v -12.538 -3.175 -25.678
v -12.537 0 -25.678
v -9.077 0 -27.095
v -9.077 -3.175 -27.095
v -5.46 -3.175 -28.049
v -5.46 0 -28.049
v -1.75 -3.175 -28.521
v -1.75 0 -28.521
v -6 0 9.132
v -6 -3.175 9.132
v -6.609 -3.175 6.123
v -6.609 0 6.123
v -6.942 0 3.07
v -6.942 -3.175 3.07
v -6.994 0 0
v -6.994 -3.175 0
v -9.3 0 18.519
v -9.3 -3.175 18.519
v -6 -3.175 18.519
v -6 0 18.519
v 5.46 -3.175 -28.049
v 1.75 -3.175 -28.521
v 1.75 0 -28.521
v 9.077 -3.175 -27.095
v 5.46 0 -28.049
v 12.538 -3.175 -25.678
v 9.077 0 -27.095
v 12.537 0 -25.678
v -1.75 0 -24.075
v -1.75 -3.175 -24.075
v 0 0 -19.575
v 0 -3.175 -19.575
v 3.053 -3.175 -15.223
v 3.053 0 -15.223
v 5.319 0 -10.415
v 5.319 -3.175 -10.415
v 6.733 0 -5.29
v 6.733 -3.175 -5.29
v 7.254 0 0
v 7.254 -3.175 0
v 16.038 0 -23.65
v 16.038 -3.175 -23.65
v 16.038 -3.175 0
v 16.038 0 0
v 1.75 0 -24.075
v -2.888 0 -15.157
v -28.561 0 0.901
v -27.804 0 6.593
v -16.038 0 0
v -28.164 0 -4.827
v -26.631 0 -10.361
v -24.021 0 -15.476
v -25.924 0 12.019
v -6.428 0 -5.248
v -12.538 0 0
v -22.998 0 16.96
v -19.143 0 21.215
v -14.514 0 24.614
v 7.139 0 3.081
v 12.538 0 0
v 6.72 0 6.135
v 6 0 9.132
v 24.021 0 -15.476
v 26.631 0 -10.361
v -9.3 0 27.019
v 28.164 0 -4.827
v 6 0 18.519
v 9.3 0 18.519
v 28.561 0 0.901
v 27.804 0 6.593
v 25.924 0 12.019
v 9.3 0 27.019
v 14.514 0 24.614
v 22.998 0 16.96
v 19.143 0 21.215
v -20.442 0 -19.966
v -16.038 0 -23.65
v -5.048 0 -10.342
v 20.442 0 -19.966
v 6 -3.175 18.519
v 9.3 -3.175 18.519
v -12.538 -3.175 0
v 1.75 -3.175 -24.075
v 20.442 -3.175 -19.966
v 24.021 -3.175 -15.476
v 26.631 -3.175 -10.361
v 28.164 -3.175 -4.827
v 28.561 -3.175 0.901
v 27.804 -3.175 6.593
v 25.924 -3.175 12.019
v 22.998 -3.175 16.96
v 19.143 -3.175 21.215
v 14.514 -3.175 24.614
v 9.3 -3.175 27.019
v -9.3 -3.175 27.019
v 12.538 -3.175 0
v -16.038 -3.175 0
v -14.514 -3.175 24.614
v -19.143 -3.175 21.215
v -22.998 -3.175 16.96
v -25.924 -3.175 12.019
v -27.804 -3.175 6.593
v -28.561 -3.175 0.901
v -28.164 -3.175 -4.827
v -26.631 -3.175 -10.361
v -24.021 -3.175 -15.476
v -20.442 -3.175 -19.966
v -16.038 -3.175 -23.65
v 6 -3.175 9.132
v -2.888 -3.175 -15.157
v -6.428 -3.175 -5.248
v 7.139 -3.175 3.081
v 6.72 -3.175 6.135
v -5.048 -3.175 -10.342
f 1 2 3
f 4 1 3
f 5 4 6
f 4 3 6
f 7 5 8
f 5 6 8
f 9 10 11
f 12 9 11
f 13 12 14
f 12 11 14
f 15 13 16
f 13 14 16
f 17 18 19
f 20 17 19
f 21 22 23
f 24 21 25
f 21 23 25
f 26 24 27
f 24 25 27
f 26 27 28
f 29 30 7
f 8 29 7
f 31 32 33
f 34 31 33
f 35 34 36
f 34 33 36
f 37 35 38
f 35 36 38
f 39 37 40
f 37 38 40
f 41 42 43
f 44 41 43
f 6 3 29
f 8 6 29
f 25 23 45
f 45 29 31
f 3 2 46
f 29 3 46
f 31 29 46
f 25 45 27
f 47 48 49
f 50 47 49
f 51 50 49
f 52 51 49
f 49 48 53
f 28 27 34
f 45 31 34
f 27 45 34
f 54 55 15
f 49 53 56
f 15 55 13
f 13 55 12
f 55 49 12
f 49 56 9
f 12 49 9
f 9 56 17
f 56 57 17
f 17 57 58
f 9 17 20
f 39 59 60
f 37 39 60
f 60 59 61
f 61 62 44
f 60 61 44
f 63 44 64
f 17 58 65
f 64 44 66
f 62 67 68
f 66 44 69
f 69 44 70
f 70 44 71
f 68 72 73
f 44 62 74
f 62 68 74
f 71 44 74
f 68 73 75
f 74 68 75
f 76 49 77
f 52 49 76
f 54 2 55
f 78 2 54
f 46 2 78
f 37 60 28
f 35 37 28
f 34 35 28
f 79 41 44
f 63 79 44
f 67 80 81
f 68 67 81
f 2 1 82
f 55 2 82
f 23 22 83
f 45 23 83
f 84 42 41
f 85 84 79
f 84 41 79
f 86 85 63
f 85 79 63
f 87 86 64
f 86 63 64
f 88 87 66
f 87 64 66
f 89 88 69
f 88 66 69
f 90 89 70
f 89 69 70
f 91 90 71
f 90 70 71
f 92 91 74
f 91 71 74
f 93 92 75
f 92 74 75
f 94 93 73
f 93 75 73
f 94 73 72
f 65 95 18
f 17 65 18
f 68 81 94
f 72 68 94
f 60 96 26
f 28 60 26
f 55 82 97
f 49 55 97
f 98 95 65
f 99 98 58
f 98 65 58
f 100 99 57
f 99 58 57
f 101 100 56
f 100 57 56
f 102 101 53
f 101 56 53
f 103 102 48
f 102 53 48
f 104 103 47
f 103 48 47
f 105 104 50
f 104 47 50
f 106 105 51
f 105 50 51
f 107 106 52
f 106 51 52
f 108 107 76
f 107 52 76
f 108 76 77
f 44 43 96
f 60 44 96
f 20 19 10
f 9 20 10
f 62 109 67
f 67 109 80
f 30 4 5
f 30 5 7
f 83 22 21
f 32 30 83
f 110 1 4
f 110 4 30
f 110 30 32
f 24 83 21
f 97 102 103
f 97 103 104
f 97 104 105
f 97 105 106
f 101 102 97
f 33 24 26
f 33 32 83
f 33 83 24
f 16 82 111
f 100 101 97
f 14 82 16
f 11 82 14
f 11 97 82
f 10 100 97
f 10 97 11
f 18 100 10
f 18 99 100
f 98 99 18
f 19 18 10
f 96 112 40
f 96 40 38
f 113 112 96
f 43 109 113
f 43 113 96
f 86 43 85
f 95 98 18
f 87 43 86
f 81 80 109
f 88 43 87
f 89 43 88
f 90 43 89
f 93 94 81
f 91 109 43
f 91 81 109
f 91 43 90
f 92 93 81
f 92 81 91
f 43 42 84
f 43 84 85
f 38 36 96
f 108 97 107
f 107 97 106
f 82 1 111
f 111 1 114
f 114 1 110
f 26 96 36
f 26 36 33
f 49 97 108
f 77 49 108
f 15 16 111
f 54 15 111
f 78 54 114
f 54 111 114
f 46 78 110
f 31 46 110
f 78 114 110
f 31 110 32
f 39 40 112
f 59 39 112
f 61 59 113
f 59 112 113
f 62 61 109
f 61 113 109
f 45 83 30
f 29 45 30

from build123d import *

# Parameters (mm, degrees)
F0_R     = 28.575
F1_DEPTH = 3.175
F3_DEPTH = 3.176


# Not quite as in the source:
# - a length typed as a fraction of an inch, garbled in the dataset ("3 / 203.2 mm" for 3/8 in), is restored


with BuildPart() as f1:
    # F0 (on Front) → F1 (new body)
    with BuildSketch(Plane.XZ):
        Circle(F0_R)
    extrude(amount=F1_DEPTH)

    # F2 (on face) → F3 (cut, through all)
    with BuildSketch(Plane.XZ.offset(3.175)):
        with BuildLine():
            Line((7.2536082684, 0), (0, 0))
            Line((0, 0), (0, -19.575))
            ThreePointArc((0, -19.575), (5.3192801015, -10.4146549257), (7.2536082684, 0))
        make_face()
        with BuildLine():
            Line((0, -19.575), (0, 0))
            Line((0, 0), (-6.9936556862, 0))
            ThreePointArc((-6.9936556862, 0), (-5.0483188999, -10.341808774), (0, -19.575))
        make_face()
        with BuildLine():
            ThreePointArc((-6, 9.1323722154), (-6.8103344804, 4.6002974695), (-6.9936556862, 0))
            Line((-6.9936556862, 0), (0, 0))
            Line((0, 0), (7.2536082684, 0))
            ThreePointArc((7.2536082684, 0), (6.9672213091, 4.6129154541), (6, 9.1323722154))
            Line((6, 9.1323722154), (6, 18.5192639611))
            Line((6, 18.5192639611), (9.3, 18.5192639611))
            Line((9.3, 18.5192639611), (9.3, 27.0192639611))
            ThreePointArc((9.3, 27.0192639611), (0, 28.575), (-9.3, 27.0192639611))
            Line((-9.3, 27.0192639611), (-9.3, 18.5192639611))
            Line((-9.3, 18.5192639611), (-6, 18.5192639611))
            Line((-6, 18.5192639611), (-6, 9.1323722154))
        make_face()
        with BuildLine():
            ThreePointArc((-16.0375, -23.650142045), (-14.3234197578, -24.7259028438), (-12.5375, -25.6776501797))
            Line((-12.5375, -25.6776501797), (-12.5375, 0))
            Line((-12.5375, 0), (-16.0375, 0))
            Line((-16.0375, 0), (-16.0375, -23.650142045))
        make_face()
        with BuildLine():
            Line((-1.75, -24.075), (-1.75, -28.5213626077))
            ThreePointArc((-1.75, -28.5213626077), (-0.8754108992, -28.5615875042), (0, -28.575))
            Line((0, -28.575), (0, -24.075))
            Line((0, -24.075), (-1.75, -24.075))
        make_face()
        with BuildLine():
            Line((0, -24.075), (0, -28.575))
            ThreePointArc((0, -28.575), (0.8754108992, -28.5615875042), (1.75, -28.5213626077))
            Line((1.75, -28.5213626077), (1.75, -24.075))
            Line((1.75, -24.075), (0, -24.075))
        make_face()
        with BuildLine():
            Line((12.5375, 0), (12.5375, -25.6776501797))
            ThreePointArc((12.5375, -25.6776501797), (14.3234197578, -24.7259028438), (16.0375, -23.650142045))
            Line((16.0375, -23.650142045), (16.0375, 0))
            Line((16.0375, 0), (12.5375, 0))
        make_face()
    extrude(amount=-F3_DEPTH, mode=Mode.SUBTRACT)


solid = f1.part
